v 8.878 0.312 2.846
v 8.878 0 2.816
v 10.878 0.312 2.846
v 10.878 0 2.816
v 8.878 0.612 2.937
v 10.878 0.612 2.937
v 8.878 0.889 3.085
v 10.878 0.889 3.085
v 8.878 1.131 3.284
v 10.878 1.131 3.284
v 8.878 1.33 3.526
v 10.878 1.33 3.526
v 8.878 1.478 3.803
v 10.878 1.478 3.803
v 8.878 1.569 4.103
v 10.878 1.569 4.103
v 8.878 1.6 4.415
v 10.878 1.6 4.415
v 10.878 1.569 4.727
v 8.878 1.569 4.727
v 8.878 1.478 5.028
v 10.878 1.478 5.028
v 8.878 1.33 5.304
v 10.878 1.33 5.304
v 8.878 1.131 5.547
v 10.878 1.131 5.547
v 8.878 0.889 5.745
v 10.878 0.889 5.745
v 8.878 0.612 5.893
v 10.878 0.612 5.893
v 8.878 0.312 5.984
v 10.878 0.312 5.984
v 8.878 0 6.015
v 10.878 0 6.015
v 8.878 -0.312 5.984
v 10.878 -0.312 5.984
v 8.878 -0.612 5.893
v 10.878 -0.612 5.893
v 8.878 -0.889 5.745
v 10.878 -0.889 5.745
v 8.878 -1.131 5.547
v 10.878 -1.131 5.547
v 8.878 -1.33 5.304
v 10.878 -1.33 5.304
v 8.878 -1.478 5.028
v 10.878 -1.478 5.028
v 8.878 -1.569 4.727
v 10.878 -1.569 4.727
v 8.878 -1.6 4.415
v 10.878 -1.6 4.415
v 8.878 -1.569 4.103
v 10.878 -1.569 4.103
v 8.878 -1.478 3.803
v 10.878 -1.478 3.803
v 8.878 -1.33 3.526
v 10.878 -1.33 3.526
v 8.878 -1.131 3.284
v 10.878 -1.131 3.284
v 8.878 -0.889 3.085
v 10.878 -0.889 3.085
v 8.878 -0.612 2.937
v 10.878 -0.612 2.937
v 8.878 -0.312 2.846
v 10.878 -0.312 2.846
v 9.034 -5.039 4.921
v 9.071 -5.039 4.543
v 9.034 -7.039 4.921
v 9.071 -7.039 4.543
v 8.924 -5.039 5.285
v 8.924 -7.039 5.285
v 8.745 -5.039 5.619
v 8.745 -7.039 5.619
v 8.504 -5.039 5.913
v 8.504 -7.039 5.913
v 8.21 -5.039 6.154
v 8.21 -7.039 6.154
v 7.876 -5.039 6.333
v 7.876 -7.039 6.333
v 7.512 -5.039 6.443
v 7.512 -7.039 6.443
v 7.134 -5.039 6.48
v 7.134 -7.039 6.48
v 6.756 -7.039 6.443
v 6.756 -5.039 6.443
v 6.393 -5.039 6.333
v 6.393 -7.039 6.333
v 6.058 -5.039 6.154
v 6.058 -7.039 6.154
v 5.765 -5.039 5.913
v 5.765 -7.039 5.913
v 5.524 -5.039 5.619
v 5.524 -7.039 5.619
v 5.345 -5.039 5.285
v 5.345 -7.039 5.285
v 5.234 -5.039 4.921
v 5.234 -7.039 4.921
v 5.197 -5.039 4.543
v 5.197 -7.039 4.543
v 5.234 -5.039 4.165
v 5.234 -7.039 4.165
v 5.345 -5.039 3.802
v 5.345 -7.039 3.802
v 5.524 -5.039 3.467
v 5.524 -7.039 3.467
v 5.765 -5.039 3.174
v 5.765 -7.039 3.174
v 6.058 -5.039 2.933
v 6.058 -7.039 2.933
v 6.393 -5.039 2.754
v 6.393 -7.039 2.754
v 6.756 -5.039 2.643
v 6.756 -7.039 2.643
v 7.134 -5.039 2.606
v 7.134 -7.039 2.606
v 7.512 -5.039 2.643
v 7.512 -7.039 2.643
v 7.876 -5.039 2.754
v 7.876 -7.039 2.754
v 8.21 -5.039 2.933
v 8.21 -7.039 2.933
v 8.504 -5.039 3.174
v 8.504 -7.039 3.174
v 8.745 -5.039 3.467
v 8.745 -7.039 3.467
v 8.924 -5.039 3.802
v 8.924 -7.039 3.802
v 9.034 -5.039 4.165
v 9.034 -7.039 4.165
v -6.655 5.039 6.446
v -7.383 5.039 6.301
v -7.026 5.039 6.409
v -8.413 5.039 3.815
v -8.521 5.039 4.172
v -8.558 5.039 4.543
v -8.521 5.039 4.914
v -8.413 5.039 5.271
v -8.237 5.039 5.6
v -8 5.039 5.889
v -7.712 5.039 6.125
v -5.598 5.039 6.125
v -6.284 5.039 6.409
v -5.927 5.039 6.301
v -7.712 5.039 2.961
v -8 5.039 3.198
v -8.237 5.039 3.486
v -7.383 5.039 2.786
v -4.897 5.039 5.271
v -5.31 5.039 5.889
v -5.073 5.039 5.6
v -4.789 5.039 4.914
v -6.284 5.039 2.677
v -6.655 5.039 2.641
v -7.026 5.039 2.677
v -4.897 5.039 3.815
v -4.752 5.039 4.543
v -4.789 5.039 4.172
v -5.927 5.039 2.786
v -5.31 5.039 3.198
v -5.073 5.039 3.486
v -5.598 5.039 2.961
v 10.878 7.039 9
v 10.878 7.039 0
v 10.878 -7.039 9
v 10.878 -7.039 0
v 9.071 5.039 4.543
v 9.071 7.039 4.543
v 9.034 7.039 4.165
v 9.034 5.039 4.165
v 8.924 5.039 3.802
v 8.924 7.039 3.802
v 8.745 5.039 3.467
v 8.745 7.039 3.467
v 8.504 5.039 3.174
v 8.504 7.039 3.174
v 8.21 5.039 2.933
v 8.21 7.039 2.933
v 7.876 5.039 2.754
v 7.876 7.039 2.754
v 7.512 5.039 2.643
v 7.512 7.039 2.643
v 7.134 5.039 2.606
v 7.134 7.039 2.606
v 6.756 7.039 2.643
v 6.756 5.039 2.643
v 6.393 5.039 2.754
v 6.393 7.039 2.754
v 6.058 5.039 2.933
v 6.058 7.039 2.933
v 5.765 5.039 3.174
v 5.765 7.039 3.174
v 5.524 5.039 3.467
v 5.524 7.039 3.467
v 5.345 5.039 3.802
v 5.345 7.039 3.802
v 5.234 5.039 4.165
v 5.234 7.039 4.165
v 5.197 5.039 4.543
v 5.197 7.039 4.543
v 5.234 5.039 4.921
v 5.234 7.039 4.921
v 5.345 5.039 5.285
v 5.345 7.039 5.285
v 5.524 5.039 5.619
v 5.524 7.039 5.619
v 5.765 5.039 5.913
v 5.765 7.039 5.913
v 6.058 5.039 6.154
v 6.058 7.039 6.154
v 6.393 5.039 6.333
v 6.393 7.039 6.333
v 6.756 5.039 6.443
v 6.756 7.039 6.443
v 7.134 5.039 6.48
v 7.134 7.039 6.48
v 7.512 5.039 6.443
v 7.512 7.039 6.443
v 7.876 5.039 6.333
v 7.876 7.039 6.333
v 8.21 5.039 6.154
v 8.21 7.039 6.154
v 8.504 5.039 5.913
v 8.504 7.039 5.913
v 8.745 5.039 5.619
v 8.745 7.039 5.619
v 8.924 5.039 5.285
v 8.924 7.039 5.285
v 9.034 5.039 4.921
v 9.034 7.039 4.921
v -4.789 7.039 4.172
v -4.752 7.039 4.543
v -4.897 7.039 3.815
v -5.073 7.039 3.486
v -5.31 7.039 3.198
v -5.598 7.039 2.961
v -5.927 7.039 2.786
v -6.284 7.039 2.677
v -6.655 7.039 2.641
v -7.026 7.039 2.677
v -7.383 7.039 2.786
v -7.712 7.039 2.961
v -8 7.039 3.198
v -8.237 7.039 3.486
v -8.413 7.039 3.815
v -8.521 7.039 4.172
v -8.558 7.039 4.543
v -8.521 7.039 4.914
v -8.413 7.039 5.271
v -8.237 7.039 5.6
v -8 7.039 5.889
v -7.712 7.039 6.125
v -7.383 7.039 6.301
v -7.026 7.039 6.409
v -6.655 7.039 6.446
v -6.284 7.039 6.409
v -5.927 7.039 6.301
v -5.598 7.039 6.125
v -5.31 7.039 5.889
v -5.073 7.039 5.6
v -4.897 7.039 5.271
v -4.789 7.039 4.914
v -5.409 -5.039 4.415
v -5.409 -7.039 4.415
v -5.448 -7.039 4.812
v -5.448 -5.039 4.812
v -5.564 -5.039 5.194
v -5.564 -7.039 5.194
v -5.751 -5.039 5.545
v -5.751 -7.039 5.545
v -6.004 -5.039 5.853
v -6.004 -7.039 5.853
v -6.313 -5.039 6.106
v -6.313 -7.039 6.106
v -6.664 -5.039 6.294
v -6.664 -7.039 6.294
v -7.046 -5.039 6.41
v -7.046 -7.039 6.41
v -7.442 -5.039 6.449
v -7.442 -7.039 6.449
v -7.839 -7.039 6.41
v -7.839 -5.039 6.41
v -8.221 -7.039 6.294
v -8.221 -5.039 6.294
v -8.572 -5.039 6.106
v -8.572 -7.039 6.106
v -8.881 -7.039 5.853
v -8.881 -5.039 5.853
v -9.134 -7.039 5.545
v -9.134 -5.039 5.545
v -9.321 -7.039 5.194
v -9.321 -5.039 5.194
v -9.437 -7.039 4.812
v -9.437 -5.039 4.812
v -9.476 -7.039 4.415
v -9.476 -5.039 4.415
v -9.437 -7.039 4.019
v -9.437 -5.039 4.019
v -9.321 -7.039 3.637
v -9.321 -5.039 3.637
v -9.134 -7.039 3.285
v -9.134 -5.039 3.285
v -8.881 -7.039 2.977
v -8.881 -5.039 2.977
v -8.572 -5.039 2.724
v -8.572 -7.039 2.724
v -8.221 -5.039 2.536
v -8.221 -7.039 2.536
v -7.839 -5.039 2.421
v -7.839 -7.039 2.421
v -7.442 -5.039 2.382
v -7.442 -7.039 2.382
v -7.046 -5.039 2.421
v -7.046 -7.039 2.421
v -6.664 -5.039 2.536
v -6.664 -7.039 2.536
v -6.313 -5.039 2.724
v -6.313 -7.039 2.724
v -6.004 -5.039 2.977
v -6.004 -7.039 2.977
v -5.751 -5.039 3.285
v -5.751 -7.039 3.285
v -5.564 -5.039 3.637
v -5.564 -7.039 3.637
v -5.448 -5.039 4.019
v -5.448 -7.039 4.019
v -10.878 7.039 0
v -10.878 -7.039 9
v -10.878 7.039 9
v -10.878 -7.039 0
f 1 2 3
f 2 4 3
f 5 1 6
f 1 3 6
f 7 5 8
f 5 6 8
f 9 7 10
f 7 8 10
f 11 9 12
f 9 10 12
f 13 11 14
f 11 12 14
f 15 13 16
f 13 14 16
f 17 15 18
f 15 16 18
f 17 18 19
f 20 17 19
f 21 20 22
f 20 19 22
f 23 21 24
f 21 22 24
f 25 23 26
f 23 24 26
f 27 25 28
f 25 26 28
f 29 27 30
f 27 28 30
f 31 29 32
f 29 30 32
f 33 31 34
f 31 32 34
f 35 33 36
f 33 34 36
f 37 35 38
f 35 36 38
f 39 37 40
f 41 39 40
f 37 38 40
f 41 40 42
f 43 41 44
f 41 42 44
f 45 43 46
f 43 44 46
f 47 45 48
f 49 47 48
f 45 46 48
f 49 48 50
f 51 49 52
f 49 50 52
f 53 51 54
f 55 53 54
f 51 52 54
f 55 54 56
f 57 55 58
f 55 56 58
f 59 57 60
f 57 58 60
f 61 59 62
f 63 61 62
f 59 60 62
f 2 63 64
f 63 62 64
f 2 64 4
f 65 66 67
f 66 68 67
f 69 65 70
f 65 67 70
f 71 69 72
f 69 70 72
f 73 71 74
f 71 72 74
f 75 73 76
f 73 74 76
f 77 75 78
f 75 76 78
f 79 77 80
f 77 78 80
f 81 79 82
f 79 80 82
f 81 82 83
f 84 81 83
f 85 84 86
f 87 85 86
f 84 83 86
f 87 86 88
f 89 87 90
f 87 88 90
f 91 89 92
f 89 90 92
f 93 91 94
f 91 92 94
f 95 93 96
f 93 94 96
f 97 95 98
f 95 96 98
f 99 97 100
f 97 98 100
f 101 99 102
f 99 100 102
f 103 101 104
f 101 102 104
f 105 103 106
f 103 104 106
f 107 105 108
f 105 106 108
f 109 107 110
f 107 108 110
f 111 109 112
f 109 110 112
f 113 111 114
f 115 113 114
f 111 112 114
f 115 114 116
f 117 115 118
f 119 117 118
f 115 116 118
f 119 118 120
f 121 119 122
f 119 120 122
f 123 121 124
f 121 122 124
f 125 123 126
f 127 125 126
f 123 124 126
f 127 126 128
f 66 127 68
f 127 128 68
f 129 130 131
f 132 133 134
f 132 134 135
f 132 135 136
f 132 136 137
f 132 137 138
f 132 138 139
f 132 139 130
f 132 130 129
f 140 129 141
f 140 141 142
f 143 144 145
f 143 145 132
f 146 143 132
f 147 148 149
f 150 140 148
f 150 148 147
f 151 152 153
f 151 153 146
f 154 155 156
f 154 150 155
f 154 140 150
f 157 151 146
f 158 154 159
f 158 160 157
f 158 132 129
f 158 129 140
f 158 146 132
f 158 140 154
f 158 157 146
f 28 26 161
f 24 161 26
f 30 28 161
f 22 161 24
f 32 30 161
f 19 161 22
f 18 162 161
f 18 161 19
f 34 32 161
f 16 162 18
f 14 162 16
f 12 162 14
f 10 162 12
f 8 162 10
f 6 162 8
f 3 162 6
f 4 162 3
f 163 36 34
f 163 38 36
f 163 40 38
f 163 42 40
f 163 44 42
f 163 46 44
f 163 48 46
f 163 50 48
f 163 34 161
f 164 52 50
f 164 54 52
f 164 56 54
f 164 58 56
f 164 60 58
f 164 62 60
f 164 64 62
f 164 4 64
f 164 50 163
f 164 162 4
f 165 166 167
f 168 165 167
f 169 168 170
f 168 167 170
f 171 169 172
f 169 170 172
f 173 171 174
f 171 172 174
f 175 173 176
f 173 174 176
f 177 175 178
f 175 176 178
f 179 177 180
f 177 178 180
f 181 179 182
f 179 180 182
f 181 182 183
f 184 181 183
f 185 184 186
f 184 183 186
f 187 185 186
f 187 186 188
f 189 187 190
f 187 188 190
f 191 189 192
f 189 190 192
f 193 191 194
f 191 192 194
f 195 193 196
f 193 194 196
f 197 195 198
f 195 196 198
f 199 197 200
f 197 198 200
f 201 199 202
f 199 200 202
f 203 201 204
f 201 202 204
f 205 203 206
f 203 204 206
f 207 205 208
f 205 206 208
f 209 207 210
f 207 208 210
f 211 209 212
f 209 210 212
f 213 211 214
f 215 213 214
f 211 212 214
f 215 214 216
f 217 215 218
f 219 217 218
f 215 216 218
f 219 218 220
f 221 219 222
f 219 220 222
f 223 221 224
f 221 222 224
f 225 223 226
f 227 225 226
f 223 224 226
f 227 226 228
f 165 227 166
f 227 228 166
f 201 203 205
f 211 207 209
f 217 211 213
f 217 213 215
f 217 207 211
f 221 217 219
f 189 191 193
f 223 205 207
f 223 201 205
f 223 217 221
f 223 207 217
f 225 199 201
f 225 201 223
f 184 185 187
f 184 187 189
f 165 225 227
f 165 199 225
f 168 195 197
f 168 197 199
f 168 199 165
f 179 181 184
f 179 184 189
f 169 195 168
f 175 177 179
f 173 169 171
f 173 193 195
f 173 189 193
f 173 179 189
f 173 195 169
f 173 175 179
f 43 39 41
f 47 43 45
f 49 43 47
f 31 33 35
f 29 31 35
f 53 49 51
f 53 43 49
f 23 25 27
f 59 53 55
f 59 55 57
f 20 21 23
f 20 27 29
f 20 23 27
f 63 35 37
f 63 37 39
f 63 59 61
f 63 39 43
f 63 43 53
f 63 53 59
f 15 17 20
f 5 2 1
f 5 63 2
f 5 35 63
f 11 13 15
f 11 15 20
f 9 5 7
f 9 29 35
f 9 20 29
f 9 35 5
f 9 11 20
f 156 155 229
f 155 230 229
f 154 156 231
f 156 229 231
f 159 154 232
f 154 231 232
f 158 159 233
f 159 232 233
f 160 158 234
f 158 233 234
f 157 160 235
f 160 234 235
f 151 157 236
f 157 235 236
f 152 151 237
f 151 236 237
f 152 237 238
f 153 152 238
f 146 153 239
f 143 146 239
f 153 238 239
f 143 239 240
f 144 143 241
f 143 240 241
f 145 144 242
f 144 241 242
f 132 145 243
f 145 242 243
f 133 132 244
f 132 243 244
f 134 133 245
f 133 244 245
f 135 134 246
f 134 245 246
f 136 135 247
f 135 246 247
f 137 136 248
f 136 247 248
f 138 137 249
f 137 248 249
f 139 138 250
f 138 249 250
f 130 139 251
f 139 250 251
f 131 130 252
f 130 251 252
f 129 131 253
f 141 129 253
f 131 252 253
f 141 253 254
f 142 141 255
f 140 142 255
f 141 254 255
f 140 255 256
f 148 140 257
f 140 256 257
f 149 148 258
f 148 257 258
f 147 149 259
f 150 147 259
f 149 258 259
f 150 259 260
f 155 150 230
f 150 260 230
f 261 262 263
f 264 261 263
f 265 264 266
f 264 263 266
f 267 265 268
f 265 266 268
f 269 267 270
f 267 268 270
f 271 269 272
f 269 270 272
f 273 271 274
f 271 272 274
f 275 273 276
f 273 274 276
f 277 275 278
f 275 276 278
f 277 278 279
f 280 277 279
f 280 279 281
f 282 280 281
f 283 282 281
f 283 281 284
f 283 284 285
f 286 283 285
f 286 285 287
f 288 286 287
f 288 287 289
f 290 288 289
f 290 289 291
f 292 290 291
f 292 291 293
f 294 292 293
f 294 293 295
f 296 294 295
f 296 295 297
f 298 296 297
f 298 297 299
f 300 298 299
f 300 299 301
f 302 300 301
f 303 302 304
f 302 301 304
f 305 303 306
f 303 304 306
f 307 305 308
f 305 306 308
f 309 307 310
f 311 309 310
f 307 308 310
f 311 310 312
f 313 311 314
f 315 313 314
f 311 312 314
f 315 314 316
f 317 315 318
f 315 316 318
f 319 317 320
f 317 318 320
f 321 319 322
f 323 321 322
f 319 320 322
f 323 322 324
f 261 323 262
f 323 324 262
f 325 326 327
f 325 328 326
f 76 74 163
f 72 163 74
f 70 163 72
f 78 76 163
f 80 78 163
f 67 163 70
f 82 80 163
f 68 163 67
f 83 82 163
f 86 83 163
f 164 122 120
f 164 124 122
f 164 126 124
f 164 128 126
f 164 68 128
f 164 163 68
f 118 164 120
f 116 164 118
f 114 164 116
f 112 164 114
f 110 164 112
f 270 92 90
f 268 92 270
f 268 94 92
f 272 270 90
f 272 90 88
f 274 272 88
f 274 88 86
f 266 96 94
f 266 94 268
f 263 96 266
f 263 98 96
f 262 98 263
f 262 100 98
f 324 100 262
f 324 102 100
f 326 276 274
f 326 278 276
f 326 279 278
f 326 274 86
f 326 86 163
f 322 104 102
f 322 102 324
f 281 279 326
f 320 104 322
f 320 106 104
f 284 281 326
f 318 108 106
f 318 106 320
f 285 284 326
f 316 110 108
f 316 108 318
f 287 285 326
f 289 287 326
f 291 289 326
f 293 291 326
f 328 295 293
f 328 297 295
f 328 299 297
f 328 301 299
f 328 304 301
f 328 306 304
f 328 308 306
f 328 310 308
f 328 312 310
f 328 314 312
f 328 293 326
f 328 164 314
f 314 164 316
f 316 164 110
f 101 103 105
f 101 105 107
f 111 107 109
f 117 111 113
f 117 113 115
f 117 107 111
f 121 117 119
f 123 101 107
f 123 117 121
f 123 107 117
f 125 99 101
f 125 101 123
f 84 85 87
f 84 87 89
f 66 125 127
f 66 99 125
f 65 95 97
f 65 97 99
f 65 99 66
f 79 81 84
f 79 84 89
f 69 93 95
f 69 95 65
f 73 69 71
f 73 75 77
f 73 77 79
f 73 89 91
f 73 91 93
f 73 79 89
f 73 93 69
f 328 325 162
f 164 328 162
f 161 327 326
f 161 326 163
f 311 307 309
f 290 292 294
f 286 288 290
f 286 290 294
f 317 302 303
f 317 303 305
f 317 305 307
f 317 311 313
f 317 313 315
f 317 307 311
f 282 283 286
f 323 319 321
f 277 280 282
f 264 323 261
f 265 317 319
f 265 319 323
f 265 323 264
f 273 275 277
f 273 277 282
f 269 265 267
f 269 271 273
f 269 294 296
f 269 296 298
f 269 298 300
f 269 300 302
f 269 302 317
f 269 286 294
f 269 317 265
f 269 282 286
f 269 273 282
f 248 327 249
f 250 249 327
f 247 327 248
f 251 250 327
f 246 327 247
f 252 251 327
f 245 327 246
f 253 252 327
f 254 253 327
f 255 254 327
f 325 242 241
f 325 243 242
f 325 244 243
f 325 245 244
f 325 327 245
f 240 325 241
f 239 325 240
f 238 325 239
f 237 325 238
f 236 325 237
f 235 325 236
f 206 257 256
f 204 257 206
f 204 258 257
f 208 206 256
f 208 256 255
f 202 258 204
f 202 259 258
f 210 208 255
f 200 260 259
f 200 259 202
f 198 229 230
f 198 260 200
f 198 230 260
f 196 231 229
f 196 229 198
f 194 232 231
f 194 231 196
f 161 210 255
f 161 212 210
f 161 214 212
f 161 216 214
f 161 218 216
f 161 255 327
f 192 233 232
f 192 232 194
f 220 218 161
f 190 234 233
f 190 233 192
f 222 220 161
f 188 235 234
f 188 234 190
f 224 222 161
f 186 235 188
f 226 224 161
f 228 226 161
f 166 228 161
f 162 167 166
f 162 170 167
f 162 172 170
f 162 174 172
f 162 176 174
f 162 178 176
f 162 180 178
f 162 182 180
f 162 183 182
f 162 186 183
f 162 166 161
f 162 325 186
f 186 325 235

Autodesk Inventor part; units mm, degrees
ref_plane "YZ Plane" through (0, 0, 0) normal (1, 0, 0) x (0, 1, 0)
ref_plane "XZ Plane" through (0, 0, 0) normal (0, 1, 0) x (-1, 0, 0)
ref_plane "XY Plane" through (0, 0, 0) normal (0, 0, 1) x (1, 0, 0)
sketch "Sketch1" plane through (0, 0, 0) normal (0, 0, 1) x (1, 0, 0)
  line L0 (10.8783, -7.0389) -> (-10.8783, -7.0389)
  line L1 (-10.8783, -7.0389) -> (-10.8783, 7.0389)
  line L2 (-10.8783, 7.0389) -> (10.8783, 7.0389)
  line L3 (10.8783, 7.0389) -> (10.8783, -7.0389)
  line L4 (10.8783, -7.0389) -> (-10.8783, 7.0389) construction
  line L5 (-10.8783, -7.0389) -> (10.8783, 7.0389) construction
  point P0 (0, 0)
extrude "Extrusion1" add sketch "Sketch1" along normal blind 9
sketch "Sketch2" plane through (-10.8783, 7.0389, 0) normal (0, 1, 0) x (1, 0, 0)
  circle A0 centre (4.2234, -4.5433) radius 1.9026
  circle A1 centre (18.0126, -4.5433) radius 1.9371
  point P0 (10.8783, 0)
extrude "Extrusion2" cut sketch "Sketch2" against normal blind 2
sketch "Sketch3" plane through (10.8783, -7.0389, 0) normal (1, 0, 0) x (0, 0, -1)
  circle A0 centre (-4.4153, 7.0389) radius 1.5998
  point P0 (0, 7.0389)
extrude "Extrusion3" cut sketch "Sketch3" against normal blind 2
sketch "Sketch4" plane through (-10.8783, -7.0389, 0) normal (0, -1, 0) x (1, 0, 0)
  circle A0 centre (18.0126, 4.5433) radius 1.9371 projected
  circle A1 centre (18.0126, 4.5433) radius 1.9371
  circle A2 centre (3.4358, 4.4153) radius 2.0338
  point P0 (10.8783, 0)
extrude "Extrusion4" cut sketch "Sketch4" against normal blind 2
properties part number "body_of_the_bot"
